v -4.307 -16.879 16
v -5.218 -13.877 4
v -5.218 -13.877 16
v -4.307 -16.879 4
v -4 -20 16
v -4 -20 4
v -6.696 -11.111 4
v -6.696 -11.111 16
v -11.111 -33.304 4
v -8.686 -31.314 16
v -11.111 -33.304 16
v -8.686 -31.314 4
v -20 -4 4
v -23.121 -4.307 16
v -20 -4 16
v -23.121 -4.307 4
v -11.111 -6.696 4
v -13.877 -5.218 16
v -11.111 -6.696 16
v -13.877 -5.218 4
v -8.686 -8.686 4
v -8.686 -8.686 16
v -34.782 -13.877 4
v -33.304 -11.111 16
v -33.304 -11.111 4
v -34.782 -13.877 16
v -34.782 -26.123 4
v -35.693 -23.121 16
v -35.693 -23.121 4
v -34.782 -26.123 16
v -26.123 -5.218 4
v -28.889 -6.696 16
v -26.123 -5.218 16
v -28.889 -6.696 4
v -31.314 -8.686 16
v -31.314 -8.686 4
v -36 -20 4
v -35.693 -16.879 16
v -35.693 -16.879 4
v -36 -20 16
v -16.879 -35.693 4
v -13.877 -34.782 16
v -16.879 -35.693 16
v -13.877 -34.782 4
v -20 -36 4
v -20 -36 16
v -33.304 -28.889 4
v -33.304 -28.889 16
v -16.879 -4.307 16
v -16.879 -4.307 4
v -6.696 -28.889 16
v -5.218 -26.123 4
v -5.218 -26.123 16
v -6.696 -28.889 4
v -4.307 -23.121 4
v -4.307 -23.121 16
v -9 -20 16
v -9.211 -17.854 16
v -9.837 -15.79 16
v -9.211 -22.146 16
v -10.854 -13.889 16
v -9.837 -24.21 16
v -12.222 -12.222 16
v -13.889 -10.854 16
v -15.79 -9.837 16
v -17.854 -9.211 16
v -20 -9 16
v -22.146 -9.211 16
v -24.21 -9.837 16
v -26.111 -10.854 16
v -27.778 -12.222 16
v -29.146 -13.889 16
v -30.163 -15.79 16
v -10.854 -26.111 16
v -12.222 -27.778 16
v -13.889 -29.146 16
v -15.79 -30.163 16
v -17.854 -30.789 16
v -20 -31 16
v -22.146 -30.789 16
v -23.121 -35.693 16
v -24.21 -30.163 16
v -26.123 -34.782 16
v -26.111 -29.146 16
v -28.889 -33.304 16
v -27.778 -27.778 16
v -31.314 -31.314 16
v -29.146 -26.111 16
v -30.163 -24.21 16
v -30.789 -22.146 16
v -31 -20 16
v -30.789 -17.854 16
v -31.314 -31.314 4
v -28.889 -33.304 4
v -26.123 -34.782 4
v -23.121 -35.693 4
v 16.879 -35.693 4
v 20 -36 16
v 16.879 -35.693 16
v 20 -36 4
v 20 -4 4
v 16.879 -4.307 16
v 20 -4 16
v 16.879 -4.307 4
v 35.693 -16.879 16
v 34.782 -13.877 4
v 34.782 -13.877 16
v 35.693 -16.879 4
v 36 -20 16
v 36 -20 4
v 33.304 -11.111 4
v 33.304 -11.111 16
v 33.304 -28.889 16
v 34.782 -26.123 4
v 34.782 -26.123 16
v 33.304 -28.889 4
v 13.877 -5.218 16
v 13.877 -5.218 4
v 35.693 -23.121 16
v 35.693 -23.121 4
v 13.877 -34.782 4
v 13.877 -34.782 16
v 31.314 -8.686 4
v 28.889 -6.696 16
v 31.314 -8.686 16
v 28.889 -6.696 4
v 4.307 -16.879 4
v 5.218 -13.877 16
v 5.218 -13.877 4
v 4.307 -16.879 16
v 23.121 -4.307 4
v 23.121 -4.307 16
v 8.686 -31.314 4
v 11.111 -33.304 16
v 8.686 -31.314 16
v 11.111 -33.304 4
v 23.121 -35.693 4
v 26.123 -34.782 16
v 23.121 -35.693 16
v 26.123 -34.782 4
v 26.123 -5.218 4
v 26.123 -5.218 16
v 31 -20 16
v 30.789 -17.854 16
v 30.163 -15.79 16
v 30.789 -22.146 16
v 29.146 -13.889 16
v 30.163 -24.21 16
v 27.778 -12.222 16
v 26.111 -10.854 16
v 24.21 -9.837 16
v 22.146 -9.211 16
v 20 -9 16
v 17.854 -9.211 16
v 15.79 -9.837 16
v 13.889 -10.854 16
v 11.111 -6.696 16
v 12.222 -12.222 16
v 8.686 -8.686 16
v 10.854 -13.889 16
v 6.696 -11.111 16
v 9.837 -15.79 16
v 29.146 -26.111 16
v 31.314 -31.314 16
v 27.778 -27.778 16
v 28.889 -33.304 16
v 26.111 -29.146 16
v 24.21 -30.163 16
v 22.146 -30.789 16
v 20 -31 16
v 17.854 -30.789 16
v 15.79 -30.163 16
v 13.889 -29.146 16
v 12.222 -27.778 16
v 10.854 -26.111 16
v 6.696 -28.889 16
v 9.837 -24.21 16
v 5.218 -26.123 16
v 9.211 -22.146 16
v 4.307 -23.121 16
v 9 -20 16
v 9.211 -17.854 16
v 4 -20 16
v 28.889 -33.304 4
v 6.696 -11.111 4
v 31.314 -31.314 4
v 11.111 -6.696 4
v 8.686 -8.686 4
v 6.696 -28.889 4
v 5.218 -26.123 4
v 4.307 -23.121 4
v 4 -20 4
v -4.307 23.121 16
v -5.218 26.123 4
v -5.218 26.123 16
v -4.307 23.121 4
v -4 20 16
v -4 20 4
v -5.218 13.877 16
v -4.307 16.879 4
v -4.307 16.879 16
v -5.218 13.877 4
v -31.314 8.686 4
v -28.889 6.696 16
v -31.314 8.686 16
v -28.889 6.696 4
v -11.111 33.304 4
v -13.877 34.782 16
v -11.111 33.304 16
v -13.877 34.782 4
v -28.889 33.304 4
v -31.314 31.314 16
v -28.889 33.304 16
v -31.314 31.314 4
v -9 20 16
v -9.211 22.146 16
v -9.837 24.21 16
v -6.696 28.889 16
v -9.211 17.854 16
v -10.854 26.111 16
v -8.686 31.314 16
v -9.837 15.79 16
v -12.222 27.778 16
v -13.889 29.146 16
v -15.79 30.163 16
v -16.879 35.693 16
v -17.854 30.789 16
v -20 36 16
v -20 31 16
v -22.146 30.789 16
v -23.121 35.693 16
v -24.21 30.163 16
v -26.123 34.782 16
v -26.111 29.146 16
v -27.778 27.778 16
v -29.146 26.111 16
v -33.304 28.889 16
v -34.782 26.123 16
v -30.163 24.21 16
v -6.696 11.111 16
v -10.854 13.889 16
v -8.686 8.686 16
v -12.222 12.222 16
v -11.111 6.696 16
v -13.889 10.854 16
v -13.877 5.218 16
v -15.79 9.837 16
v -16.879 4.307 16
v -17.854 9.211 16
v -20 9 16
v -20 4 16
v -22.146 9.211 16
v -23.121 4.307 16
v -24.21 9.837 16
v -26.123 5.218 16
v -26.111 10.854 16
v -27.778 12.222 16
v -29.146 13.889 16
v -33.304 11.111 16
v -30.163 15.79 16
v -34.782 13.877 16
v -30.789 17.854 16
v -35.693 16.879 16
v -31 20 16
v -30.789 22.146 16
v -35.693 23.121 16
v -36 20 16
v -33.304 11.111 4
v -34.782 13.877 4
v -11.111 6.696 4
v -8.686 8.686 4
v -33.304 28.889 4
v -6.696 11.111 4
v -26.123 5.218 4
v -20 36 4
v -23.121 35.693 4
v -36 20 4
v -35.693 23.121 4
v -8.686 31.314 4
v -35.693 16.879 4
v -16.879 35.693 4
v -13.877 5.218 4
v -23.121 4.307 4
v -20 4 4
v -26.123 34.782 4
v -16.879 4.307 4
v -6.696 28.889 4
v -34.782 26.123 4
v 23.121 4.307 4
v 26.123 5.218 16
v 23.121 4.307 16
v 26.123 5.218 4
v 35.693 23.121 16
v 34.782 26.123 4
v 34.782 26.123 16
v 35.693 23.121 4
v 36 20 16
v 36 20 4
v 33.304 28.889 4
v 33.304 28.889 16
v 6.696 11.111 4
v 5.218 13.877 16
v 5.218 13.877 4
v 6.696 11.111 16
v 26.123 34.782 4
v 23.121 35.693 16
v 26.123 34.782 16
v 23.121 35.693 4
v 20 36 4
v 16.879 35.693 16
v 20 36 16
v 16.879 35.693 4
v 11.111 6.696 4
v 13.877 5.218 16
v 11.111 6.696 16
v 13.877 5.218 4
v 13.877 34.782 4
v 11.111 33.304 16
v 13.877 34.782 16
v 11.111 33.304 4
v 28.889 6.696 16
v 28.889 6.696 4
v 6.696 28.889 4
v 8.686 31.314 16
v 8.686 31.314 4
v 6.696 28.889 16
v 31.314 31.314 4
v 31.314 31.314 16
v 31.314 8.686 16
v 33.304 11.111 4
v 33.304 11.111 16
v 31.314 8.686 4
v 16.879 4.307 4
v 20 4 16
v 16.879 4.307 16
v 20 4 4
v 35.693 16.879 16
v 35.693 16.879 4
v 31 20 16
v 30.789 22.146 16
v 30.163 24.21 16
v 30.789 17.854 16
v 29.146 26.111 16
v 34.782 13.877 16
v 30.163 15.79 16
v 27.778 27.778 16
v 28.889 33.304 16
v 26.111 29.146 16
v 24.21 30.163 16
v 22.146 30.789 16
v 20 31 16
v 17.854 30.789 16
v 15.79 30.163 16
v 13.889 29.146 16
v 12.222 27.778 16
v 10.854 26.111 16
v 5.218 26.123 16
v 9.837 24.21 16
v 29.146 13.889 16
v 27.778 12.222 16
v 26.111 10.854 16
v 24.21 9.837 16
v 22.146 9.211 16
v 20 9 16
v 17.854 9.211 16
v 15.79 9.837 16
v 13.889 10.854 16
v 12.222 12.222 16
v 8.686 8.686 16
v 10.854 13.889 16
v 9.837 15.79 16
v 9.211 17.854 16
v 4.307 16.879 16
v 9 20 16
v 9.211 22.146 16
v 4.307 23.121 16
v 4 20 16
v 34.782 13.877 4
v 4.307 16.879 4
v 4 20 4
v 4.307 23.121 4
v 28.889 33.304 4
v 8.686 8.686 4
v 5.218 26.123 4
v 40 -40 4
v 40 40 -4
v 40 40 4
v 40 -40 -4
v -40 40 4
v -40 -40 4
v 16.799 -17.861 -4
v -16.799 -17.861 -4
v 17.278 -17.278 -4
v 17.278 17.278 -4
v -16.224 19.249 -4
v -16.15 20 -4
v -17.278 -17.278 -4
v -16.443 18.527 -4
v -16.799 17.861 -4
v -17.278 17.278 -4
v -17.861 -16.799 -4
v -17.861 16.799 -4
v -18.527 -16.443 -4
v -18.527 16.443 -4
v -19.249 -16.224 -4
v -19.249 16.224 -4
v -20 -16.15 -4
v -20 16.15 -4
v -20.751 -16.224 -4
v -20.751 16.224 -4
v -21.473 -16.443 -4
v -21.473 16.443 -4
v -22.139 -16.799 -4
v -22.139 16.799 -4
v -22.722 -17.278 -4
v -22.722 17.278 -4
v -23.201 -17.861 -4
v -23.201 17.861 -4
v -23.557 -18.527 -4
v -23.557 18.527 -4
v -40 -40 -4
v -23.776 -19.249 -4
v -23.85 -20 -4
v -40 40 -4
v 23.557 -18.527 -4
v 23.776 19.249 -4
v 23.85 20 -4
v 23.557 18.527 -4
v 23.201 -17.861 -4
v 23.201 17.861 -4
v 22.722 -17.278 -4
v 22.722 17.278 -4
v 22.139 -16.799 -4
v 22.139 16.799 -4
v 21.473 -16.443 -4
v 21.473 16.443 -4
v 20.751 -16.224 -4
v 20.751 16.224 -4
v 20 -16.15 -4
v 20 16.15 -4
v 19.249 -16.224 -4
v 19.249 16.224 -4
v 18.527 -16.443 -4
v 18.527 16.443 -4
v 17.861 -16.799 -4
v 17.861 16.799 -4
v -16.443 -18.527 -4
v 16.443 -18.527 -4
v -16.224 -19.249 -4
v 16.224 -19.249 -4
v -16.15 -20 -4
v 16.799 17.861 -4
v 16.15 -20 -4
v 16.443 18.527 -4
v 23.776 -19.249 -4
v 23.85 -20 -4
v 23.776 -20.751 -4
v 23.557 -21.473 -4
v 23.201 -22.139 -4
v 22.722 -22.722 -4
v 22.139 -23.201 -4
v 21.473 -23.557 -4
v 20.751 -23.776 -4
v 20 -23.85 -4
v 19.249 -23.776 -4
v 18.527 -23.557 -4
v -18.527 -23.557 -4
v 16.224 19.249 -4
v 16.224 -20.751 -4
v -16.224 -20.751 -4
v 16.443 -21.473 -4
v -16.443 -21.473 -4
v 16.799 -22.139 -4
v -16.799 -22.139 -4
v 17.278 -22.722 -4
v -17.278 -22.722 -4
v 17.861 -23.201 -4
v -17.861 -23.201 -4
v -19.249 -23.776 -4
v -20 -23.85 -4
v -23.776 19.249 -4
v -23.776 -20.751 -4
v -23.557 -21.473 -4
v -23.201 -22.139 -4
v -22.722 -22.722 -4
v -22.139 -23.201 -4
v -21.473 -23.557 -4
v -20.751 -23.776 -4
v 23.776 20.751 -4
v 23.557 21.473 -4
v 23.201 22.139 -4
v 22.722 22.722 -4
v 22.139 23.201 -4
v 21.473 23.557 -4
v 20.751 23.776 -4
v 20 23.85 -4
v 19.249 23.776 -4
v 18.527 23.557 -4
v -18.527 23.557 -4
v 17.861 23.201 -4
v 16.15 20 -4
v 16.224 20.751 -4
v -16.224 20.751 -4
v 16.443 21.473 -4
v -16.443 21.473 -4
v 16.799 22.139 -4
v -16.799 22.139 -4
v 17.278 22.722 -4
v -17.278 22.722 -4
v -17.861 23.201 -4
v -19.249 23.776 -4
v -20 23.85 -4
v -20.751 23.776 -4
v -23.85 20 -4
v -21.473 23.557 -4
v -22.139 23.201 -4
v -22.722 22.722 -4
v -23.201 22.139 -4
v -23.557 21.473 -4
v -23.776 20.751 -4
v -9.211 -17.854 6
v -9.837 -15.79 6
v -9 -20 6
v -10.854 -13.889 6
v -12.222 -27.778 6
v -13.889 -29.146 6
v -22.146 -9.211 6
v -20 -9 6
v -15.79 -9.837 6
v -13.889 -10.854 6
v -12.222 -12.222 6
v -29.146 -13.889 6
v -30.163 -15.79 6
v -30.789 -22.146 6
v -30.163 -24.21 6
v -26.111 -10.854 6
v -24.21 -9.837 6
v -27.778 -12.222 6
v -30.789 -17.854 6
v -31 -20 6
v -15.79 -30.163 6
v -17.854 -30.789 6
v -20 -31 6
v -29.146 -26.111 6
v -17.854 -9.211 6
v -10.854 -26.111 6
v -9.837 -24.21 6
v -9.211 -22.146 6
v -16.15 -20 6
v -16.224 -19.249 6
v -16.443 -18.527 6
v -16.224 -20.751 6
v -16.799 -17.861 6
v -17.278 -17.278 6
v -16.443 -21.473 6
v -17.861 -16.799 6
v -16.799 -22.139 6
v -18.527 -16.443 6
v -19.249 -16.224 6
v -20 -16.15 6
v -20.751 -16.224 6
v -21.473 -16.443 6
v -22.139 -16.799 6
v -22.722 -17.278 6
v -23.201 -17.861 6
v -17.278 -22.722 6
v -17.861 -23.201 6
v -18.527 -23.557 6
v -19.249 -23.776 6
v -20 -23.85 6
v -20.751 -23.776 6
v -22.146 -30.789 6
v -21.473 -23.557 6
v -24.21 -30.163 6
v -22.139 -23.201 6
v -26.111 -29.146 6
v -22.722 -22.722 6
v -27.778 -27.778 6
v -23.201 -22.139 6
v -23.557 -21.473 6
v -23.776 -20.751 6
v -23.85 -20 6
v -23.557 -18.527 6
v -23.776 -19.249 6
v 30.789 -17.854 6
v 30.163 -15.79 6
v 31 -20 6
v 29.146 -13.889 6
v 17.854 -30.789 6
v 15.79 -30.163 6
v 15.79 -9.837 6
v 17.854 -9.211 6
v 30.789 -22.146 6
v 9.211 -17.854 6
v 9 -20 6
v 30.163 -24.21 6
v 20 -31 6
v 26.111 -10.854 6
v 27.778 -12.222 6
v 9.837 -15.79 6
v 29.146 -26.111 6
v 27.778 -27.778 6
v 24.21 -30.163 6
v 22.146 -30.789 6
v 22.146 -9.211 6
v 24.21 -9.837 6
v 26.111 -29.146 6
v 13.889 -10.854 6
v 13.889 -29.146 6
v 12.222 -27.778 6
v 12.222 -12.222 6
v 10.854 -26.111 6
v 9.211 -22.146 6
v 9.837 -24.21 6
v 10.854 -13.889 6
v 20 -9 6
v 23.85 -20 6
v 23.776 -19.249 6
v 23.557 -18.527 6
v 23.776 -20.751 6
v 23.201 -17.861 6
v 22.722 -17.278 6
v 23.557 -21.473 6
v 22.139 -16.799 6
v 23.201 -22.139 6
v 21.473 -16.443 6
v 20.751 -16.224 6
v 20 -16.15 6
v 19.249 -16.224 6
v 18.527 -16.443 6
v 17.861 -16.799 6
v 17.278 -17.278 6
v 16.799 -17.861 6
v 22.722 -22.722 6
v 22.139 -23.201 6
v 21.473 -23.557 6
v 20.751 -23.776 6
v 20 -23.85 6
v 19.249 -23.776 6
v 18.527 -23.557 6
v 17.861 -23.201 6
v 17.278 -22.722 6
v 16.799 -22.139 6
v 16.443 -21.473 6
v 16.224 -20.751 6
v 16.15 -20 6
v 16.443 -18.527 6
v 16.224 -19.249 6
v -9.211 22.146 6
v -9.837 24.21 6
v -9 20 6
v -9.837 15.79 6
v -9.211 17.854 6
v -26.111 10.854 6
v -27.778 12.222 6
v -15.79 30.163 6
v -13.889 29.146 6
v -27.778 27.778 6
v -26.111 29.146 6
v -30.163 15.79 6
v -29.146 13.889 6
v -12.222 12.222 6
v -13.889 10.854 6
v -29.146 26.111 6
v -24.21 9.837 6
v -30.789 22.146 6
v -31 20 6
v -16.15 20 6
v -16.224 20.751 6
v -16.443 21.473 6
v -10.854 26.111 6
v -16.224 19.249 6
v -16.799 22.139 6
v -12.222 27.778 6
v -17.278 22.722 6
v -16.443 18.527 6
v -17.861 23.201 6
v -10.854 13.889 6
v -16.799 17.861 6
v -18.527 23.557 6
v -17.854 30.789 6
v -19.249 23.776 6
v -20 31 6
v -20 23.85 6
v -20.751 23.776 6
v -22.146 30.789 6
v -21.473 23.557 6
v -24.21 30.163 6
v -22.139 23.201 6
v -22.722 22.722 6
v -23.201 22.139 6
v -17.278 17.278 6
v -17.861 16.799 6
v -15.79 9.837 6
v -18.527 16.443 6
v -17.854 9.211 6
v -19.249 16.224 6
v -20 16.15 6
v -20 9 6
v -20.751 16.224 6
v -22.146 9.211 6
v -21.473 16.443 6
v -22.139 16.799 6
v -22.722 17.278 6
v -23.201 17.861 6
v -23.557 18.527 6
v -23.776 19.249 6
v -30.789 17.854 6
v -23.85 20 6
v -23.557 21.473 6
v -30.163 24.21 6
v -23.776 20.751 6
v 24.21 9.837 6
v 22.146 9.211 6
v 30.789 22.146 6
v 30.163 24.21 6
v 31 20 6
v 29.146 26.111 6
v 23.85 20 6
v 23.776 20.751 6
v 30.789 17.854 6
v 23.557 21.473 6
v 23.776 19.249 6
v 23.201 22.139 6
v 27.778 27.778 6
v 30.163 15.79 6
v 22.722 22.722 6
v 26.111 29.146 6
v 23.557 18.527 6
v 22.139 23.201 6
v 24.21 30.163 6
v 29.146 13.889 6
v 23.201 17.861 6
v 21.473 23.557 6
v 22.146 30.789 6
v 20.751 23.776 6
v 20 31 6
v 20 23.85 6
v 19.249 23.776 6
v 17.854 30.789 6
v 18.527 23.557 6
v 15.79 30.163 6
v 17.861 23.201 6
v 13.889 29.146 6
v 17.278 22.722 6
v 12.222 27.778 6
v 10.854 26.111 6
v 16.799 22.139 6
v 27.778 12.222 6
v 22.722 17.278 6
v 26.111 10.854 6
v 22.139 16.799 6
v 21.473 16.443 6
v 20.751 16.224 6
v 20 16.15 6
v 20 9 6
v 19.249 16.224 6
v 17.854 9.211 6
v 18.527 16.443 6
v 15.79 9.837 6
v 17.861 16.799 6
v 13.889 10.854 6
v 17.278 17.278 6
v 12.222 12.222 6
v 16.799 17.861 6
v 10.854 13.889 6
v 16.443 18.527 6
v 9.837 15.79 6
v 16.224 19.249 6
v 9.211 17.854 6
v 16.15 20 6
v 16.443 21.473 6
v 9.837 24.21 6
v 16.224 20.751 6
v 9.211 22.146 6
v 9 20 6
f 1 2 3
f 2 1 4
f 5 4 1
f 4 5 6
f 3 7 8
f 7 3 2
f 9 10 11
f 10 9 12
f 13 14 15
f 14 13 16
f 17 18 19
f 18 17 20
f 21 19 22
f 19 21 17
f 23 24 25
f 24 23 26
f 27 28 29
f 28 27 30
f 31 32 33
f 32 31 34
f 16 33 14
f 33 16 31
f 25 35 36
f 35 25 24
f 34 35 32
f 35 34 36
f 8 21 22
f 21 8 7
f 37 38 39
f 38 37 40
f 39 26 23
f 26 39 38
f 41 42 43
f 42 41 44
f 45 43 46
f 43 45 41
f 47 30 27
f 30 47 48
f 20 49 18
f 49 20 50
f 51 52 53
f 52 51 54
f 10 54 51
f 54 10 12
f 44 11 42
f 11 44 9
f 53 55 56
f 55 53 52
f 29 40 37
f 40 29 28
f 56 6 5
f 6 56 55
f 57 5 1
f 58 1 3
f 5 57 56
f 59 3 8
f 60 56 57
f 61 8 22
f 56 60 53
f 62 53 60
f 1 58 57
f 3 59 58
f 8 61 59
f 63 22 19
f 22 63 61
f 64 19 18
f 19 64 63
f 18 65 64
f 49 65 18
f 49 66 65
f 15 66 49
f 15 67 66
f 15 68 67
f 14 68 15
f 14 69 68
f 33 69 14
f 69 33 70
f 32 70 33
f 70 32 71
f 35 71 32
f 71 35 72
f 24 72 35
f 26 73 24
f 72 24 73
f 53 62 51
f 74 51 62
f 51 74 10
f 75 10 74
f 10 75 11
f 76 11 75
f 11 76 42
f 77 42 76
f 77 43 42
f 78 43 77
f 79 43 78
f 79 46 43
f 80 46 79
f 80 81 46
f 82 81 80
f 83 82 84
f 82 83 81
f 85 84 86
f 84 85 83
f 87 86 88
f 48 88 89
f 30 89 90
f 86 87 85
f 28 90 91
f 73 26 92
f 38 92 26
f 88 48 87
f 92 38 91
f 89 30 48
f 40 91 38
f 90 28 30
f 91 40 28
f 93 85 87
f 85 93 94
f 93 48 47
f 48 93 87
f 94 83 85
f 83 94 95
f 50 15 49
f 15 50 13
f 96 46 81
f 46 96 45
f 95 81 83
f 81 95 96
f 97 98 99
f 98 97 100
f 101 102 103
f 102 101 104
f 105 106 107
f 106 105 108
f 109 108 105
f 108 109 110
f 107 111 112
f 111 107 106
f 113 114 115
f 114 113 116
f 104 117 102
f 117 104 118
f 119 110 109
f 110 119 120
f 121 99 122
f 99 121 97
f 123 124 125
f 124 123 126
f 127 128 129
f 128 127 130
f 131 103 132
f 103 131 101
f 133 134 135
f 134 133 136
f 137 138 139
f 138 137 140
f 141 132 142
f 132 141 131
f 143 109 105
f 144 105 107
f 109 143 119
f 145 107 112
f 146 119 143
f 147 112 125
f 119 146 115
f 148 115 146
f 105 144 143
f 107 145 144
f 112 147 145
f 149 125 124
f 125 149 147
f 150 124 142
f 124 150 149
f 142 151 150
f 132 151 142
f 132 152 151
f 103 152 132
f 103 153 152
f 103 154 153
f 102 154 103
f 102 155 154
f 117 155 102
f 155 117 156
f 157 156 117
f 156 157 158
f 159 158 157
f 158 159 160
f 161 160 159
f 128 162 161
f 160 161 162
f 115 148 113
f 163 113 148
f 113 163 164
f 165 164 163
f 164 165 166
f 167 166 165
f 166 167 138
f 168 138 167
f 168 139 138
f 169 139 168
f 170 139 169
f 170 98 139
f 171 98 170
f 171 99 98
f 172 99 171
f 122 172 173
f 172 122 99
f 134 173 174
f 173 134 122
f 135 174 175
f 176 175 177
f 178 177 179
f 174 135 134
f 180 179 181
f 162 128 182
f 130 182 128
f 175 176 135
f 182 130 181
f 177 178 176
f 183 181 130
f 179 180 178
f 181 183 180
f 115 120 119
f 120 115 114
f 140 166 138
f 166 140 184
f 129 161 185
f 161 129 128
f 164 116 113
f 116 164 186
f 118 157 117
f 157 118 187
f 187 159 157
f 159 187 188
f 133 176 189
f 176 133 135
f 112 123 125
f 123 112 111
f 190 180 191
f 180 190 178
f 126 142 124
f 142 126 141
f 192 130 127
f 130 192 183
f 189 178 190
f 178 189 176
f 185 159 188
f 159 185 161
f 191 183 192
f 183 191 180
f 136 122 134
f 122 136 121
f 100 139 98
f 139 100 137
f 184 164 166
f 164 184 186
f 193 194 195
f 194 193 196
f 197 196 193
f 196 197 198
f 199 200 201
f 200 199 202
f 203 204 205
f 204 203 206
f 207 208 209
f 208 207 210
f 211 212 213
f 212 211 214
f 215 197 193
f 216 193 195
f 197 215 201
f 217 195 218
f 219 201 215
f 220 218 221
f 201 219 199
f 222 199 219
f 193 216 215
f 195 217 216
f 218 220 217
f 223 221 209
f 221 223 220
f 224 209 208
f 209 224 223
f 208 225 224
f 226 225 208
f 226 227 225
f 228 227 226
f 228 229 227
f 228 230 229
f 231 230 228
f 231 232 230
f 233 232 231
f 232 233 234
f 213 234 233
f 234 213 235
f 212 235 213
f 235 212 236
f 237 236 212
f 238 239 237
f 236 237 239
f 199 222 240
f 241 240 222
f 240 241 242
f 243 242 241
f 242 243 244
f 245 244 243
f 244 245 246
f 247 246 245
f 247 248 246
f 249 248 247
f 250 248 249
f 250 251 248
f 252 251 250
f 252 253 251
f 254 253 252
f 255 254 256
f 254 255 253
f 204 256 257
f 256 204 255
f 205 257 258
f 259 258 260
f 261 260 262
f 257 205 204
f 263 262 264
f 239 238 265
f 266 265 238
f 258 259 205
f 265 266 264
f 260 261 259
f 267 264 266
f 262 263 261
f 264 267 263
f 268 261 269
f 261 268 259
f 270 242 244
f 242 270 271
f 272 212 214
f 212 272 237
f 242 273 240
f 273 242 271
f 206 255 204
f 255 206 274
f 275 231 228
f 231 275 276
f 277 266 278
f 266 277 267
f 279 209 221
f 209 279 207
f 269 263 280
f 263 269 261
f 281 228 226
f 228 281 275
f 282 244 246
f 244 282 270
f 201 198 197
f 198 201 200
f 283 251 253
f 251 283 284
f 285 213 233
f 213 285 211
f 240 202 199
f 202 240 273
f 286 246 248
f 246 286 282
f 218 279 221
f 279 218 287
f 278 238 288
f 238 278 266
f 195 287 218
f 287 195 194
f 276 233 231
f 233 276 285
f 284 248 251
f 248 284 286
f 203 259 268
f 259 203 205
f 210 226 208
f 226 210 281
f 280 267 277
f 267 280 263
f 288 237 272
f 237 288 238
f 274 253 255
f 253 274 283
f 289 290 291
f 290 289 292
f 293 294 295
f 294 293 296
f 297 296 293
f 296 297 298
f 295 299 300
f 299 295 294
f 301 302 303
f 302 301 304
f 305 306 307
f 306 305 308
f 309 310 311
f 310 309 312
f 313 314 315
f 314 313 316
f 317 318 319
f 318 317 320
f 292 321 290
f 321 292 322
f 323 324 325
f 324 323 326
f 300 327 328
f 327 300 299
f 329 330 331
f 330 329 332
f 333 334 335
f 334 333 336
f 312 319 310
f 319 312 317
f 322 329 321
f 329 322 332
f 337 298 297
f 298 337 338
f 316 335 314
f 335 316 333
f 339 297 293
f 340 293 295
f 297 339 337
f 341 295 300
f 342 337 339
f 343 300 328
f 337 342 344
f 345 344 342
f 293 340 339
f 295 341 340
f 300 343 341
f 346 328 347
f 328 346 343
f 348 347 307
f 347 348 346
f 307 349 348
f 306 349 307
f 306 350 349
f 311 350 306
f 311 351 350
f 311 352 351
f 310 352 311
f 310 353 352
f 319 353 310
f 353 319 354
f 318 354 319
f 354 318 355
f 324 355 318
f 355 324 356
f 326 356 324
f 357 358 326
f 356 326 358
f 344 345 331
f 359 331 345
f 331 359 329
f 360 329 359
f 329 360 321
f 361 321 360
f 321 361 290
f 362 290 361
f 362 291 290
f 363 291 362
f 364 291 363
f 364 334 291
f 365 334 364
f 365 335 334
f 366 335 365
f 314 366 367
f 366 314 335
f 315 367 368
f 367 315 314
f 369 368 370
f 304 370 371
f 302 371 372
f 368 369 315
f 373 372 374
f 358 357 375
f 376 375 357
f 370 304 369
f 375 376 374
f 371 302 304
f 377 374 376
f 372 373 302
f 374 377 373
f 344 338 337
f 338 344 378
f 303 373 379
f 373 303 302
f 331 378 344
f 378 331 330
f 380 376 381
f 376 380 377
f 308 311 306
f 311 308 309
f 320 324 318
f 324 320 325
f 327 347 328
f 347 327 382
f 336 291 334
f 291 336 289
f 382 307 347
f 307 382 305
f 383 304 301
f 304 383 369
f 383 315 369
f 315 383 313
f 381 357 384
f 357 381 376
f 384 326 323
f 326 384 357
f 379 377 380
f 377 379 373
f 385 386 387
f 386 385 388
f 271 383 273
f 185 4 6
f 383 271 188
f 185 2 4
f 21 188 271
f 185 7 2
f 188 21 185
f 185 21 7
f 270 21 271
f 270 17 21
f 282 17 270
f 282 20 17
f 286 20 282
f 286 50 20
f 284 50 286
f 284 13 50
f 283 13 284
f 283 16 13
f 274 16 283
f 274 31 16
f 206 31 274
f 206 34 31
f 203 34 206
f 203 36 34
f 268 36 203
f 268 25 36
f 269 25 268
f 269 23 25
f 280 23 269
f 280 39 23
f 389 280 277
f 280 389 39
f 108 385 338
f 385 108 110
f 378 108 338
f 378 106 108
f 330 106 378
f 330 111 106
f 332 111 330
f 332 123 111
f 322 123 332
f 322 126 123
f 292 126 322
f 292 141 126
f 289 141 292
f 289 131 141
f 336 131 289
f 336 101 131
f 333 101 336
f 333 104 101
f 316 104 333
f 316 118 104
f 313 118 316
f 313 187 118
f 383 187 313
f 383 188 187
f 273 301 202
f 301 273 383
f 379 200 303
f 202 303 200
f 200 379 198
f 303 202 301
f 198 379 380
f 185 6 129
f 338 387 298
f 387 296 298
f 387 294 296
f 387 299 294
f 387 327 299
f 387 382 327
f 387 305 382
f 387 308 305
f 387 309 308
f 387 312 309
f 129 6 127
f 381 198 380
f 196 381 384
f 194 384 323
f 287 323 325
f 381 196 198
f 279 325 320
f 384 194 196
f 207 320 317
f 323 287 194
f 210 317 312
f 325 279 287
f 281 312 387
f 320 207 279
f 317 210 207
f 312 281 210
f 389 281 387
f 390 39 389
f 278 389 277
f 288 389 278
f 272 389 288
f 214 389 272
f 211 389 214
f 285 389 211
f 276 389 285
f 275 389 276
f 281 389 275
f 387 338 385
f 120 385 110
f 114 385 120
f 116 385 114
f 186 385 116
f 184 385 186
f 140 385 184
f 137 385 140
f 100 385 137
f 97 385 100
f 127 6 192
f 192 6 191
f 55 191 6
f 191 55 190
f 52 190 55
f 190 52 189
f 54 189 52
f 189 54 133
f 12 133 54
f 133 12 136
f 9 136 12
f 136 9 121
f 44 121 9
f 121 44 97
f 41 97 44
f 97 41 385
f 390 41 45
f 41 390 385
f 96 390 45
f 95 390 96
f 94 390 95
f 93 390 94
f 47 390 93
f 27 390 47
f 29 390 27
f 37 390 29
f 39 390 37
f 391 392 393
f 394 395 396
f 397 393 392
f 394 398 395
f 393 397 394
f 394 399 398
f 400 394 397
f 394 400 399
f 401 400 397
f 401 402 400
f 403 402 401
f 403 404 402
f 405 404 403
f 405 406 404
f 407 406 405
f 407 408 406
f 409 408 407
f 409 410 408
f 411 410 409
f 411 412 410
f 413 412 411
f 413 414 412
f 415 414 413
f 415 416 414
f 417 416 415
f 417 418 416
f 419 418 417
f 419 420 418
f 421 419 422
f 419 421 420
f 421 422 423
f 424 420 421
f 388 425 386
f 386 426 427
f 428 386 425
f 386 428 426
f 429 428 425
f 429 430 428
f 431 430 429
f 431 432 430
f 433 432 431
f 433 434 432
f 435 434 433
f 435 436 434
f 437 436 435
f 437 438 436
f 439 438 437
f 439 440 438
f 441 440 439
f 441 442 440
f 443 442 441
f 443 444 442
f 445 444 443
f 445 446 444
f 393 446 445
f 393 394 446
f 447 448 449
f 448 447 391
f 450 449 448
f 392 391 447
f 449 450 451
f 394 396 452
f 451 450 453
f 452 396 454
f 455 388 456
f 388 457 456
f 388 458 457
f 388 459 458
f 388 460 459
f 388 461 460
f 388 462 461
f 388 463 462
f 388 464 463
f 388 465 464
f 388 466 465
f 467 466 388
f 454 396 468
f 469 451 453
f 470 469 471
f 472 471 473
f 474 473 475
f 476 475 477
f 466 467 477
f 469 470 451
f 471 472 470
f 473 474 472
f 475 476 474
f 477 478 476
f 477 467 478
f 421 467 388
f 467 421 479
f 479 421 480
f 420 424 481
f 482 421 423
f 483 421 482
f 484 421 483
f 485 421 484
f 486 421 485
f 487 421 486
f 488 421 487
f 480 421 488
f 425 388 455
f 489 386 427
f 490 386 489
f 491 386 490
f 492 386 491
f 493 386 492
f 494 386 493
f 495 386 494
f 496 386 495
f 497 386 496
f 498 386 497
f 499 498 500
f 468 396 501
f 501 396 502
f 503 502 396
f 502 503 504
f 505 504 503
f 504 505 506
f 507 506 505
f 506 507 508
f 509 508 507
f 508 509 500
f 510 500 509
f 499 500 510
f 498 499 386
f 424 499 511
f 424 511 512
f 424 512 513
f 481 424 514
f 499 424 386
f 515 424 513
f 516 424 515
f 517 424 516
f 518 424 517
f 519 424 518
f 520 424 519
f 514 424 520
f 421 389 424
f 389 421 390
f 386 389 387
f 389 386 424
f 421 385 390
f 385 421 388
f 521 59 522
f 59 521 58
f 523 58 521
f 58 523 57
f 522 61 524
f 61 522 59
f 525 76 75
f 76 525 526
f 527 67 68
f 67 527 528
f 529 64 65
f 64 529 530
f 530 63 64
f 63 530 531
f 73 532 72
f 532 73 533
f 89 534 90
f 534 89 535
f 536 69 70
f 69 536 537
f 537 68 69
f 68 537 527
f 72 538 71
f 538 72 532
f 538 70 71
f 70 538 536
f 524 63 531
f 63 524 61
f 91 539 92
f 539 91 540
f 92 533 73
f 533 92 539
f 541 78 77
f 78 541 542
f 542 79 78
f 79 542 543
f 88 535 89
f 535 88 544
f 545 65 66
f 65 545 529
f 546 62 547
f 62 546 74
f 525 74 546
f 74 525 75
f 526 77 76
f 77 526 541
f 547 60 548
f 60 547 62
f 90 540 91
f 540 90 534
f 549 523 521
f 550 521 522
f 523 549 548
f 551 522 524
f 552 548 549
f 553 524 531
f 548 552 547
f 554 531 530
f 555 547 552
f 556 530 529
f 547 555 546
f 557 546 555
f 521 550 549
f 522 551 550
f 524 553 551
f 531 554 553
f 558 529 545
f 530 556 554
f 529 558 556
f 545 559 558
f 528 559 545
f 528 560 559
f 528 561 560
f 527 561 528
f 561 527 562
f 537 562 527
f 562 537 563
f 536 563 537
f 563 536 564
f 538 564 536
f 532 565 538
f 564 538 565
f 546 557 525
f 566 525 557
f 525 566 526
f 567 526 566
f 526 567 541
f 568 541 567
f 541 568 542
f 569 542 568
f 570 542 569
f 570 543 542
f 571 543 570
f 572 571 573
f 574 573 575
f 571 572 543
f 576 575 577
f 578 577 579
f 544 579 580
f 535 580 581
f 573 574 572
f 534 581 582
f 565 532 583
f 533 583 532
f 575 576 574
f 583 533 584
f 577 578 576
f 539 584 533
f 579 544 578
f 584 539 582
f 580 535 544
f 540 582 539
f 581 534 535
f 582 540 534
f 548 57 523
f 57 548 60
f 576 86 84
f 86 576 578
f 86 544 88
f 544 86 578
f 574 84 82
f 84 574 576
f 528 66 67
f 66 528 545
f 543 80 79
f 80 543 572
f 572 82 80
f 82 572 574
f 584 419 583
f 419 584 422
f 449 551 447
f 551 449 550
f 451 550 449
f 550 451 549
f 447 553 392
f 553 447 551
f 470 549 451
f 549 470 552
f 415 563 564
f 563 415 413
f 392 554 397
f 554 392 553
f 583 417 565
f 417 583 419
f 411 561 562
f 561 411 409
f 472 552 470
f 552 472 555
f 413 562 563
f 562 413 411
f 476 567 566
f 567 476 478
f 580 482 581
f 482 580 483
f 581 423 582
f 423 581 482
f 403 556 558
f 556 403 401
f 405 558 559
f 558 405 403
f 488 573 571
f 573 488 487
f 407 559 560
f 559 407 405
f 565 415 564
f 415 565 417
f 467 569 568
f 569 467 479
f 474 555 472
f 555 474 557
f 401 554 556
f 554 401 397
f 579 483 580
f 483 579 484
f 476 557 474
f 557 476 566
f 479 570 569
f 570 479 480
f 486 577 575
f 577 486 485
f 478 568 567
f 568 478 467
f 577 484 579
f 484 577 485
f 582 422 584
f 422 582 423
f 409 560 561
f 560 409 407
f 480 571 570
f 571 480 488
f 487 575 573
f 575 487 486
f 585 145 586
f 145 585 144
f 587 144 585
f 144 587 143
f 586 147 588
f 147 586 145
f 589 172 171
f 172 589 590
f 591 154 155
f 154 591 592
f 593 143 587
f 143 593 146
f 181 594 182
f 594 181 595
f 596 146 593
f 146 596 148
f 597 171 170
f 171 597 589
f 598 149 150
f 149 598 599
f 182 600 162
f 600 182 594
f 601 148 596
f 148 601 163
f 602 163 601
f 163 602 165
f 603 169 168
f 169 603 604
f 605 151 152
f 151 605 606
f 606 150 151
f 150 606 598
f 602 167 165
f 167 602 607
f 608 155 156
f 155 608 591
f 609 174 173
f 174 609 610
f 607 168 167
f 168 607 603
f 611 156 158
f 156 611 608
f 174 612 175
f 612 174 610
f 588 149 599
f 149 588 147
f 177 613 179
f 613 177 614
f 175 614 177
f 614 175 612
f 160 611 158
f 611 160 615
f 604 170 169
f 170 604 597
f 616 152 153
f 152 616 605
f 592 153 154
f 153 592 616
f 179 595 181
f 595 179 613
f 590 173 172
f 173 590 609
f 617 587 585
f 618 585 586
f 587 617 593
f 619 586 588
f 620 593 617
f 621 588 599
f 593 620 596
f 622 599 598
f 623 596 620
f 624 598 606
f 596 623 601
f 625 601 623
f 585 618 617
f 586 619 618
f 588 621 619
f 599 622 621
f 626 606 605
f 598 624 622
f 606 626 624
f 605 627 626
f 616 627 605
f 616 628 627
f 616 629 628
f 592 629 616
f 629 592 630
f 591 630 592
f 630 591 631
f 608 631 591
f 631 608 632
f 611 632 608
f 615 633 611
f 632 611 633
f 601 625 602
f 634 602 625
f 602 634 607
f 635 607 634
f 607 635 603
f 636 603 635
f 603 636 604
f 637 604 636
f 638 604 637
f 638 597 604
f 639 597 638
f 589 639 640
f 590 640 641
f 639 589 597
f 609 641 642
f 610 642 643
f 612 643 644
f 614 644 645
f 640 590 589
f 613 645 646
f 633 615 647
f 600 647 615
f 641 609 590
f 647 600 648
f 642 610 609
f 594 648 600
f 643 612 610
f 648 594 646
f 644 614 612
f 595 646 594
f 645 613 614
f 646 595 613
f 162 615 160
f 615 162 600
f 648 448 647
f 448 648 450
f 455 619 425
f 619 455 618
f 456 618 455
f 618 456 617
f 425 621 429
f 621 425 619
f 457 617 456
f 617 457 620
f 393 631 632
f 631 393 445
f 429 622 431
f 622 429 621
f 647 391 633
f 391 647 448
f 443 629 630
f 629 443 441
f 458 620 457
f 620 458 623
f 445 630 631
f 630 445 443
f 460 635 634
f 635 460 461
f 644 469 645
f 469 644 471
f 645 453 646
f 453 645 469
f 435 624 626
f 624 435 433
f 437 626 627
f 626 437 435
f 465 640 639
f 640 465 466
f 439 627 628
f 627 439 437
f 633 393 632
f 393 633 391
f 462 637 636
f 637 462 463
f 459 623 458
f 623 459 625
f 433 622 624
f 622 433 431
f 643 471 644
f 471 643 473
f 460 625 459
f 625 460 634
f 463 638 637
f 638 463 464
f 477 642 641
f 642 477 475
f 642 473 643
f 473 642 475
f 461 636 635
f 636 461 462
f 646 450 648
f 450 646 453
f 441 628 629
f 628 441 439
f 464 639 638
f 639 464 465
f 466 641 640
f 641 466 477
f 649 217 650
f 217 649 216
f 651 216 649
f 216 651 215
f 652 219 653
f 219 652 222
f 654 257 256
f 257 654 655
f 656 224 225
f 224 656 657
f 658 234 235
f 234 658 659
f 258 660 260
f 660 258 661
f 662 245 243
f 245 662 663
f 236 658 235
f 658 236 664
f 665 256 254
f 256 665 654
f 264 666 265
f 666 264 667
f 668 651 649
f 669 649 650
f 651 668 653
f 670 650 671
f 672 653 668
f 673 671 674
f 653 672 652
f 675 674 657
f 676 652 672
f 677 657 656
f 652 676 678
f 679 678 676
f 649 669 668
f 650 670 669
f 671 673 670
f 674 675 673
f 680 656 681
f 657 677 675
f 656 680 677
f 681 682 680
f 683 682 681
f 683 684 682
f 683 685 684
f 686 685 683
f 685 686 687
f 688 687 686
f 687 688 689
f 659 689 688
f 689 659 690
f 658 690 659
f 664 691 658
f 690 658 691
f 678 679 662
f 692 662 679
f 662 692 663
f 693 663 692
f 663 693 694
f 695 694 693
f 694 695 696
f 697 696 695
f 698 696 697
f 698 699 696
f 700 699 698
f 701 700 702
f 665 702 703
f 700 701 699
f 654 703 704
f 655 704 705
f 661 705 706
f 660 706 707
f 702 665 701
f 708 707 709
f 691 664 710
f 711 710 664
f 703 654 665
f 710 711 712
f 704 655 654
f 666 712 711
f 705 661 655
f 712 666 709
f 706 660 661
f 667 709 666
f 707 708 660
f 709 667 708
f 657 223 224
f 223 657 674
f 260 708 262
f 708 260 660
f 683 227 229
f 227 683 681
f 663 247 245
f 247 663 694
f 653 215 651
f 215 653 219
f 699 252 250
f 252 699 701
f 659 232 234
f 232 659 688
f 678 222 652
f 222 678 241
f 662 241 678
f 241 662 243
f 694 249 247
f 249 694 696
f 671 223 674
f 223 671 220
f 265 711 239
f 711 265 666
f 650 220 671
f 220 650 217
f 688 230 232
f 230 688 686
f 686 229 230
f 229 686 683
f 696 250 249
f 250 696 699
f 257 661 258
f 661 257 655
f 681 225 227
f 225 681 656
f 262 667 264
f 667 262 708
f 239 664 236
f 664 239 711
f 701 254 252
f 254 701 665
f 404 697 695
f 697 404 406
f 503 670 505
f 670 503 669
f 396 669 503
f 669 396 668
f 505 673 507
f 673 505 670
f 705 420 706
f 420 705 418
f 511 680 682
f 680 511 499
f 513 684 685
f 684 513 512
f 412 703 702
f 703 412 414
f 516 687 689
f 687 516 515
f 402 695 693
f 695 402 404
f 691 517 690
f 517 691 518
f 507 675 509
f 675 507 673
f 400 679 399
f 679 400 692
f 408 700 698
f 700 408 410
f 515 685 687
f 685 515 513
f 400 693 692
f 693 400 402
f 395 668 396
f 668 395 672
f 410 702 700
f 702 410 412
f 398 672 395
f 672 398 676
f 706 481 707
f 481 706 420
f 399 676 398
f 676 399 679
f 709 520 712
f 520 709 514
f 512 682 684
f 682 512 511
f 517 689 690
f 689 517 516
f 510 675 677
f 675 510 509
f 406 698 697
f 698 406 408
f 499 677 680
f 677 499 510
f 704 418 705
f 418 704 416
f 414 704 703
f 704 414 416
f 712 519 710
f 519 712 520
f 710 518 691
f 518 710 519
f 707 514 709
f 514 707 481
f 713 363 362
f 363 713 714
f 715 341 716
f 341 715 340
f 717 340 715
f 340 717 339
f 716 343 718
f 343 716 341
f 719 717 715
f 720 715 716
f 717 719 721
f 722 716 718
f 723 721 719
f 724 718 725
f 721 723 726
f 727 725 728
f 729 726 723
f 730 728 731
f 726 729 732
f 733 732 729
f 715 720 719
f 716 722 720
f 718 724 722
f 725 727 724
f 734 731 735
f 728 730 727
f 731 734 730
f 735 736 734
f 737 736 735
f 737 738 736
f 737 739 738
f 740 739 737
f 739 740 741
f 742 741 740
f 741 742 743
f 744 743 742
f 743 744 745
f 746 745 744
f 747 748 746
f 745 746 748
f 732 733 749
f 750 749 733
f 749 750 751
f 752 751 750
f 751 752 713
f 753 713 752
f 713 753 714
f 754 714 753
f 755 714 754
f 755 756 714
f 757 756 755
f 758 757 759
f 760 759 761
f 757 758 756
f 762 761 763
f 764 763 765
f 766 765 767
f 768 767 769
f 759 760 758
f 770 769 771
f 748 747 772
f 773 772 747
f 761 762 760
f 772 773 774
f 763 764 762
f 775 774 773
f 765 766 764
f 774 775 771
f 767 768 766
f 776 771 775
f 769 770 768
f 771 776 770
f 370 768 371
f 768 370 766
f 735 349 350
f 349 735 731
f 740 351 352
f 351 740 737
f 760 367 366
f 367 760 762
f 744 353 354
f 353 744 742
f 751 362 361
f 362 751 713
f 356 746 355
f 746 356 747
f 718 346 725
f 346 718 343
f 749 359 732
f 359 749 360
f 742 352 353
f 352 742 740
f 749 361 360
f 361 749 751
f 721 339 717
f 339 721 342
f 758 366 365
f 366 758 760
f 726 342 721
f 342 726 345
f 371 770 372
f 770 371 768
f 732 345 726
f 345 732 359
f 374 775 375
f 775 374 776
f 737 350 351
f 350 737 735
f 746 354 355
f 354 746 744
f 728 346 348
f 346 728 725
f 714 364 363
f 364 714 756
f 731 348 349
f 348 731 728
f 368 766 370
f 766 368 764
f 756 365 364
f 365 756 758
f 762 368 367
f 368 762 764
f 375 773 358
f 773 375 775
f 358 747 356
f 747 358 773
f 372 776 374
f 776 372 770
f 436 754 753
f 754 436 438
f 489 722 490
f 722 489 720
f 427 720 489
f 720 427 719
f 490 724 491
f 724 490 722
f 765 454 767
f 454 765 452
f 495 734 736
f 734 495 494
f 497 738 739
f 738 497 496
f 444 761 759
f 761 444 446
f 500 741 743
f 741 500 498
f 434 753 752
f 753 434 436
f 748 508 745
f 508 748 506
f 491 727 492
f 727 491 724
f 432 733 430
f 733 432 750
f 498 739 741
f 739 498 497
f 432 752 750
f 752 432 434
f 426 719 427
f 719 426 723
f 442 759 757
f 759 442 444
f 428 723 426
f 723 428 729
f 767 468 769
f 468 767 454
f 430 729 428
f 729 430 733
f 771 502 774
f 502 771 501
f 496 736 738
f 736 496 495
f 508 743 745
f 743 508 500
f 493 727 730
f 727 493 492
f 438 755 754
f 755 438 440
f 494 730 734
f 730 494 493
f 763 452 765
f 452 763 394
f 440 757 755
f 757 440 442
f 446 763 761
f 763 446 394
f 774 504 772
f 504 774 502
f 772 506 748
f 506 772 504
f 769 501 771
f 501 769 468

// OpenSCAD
$fn = 32;

// ----------------------------------------------------------------------
// Socket pad plate
// bosses with counterbored sockets for the screws
// ----------------------------------------------------------------------

// --- parameters (mm) ---
base_t = 8;         // base plate thickness
boss_h = 12;        // boss height above the base plate
boss_d = 32;        // boss diameter
socket_d = 22;      // socket diameter
socket_depth = 10;  // socket depth from the boss face
bolt_d = 7.7;       // screw clearance hole through the socket floor
rows = 2;           // boss rows
cols = 2;           // bosses per row
pitch = 40;         // boss pitch

// --- derived feature positions (mm) ---
height = base_t + boss_h;           // = 20   overall height of the part
plate = [pitch * (cols - 1) + boss_d + 8, pitch * (rows - 1) + boss_d + 8, base_t];  // = [80, 80, 8]   overall size (x, y, z)
span_x = pitch * (cols - 1);        // = 40   distance between outer bosses
span_y = pitch * (rows - 1);        // = 40   distance between boss rows
origin_x = -span_x / 2;             // = -20   X of the first boss
origin_y = -span_y / 2;             // = -20   Y of the first boss
feature_centers = [
  [origin_x + 0 * pitch, origin_y + 0 * pitch],
  [origin_x + 1 * pitch, origin_y + 0 * pitch],
  [origin_x + 0 * pitch, origin_y + 1 * pitch],
  [origin_x + 1 * pitch, origin_y + 1 * pitch]
];   // boss centres: sockets, holes and the pads themselves are placed from here

// base plate, bosses on feature_centers, socket + through hole in each
difference() {
  union() {
    cube(plate, center = true);
    for (centre = feature_centers)
      translate([centre[0], centre[1], plate[2] / 2 - 1])
        cylinder(d = boss_d, h = boss_h + 1);
  }
  for (centre = feature_centers) {
    translate([centre[0], centre[1], plate[2] / 2 + boss_h - socket_depth])
      cylinder(d = socket_d, h = socket_depth + 1);
    translate([centre[0], centre[1], -height])
      cylinder(d = bolt_d, h = 2 * height + 2);  // through the socket floor
  }
}
